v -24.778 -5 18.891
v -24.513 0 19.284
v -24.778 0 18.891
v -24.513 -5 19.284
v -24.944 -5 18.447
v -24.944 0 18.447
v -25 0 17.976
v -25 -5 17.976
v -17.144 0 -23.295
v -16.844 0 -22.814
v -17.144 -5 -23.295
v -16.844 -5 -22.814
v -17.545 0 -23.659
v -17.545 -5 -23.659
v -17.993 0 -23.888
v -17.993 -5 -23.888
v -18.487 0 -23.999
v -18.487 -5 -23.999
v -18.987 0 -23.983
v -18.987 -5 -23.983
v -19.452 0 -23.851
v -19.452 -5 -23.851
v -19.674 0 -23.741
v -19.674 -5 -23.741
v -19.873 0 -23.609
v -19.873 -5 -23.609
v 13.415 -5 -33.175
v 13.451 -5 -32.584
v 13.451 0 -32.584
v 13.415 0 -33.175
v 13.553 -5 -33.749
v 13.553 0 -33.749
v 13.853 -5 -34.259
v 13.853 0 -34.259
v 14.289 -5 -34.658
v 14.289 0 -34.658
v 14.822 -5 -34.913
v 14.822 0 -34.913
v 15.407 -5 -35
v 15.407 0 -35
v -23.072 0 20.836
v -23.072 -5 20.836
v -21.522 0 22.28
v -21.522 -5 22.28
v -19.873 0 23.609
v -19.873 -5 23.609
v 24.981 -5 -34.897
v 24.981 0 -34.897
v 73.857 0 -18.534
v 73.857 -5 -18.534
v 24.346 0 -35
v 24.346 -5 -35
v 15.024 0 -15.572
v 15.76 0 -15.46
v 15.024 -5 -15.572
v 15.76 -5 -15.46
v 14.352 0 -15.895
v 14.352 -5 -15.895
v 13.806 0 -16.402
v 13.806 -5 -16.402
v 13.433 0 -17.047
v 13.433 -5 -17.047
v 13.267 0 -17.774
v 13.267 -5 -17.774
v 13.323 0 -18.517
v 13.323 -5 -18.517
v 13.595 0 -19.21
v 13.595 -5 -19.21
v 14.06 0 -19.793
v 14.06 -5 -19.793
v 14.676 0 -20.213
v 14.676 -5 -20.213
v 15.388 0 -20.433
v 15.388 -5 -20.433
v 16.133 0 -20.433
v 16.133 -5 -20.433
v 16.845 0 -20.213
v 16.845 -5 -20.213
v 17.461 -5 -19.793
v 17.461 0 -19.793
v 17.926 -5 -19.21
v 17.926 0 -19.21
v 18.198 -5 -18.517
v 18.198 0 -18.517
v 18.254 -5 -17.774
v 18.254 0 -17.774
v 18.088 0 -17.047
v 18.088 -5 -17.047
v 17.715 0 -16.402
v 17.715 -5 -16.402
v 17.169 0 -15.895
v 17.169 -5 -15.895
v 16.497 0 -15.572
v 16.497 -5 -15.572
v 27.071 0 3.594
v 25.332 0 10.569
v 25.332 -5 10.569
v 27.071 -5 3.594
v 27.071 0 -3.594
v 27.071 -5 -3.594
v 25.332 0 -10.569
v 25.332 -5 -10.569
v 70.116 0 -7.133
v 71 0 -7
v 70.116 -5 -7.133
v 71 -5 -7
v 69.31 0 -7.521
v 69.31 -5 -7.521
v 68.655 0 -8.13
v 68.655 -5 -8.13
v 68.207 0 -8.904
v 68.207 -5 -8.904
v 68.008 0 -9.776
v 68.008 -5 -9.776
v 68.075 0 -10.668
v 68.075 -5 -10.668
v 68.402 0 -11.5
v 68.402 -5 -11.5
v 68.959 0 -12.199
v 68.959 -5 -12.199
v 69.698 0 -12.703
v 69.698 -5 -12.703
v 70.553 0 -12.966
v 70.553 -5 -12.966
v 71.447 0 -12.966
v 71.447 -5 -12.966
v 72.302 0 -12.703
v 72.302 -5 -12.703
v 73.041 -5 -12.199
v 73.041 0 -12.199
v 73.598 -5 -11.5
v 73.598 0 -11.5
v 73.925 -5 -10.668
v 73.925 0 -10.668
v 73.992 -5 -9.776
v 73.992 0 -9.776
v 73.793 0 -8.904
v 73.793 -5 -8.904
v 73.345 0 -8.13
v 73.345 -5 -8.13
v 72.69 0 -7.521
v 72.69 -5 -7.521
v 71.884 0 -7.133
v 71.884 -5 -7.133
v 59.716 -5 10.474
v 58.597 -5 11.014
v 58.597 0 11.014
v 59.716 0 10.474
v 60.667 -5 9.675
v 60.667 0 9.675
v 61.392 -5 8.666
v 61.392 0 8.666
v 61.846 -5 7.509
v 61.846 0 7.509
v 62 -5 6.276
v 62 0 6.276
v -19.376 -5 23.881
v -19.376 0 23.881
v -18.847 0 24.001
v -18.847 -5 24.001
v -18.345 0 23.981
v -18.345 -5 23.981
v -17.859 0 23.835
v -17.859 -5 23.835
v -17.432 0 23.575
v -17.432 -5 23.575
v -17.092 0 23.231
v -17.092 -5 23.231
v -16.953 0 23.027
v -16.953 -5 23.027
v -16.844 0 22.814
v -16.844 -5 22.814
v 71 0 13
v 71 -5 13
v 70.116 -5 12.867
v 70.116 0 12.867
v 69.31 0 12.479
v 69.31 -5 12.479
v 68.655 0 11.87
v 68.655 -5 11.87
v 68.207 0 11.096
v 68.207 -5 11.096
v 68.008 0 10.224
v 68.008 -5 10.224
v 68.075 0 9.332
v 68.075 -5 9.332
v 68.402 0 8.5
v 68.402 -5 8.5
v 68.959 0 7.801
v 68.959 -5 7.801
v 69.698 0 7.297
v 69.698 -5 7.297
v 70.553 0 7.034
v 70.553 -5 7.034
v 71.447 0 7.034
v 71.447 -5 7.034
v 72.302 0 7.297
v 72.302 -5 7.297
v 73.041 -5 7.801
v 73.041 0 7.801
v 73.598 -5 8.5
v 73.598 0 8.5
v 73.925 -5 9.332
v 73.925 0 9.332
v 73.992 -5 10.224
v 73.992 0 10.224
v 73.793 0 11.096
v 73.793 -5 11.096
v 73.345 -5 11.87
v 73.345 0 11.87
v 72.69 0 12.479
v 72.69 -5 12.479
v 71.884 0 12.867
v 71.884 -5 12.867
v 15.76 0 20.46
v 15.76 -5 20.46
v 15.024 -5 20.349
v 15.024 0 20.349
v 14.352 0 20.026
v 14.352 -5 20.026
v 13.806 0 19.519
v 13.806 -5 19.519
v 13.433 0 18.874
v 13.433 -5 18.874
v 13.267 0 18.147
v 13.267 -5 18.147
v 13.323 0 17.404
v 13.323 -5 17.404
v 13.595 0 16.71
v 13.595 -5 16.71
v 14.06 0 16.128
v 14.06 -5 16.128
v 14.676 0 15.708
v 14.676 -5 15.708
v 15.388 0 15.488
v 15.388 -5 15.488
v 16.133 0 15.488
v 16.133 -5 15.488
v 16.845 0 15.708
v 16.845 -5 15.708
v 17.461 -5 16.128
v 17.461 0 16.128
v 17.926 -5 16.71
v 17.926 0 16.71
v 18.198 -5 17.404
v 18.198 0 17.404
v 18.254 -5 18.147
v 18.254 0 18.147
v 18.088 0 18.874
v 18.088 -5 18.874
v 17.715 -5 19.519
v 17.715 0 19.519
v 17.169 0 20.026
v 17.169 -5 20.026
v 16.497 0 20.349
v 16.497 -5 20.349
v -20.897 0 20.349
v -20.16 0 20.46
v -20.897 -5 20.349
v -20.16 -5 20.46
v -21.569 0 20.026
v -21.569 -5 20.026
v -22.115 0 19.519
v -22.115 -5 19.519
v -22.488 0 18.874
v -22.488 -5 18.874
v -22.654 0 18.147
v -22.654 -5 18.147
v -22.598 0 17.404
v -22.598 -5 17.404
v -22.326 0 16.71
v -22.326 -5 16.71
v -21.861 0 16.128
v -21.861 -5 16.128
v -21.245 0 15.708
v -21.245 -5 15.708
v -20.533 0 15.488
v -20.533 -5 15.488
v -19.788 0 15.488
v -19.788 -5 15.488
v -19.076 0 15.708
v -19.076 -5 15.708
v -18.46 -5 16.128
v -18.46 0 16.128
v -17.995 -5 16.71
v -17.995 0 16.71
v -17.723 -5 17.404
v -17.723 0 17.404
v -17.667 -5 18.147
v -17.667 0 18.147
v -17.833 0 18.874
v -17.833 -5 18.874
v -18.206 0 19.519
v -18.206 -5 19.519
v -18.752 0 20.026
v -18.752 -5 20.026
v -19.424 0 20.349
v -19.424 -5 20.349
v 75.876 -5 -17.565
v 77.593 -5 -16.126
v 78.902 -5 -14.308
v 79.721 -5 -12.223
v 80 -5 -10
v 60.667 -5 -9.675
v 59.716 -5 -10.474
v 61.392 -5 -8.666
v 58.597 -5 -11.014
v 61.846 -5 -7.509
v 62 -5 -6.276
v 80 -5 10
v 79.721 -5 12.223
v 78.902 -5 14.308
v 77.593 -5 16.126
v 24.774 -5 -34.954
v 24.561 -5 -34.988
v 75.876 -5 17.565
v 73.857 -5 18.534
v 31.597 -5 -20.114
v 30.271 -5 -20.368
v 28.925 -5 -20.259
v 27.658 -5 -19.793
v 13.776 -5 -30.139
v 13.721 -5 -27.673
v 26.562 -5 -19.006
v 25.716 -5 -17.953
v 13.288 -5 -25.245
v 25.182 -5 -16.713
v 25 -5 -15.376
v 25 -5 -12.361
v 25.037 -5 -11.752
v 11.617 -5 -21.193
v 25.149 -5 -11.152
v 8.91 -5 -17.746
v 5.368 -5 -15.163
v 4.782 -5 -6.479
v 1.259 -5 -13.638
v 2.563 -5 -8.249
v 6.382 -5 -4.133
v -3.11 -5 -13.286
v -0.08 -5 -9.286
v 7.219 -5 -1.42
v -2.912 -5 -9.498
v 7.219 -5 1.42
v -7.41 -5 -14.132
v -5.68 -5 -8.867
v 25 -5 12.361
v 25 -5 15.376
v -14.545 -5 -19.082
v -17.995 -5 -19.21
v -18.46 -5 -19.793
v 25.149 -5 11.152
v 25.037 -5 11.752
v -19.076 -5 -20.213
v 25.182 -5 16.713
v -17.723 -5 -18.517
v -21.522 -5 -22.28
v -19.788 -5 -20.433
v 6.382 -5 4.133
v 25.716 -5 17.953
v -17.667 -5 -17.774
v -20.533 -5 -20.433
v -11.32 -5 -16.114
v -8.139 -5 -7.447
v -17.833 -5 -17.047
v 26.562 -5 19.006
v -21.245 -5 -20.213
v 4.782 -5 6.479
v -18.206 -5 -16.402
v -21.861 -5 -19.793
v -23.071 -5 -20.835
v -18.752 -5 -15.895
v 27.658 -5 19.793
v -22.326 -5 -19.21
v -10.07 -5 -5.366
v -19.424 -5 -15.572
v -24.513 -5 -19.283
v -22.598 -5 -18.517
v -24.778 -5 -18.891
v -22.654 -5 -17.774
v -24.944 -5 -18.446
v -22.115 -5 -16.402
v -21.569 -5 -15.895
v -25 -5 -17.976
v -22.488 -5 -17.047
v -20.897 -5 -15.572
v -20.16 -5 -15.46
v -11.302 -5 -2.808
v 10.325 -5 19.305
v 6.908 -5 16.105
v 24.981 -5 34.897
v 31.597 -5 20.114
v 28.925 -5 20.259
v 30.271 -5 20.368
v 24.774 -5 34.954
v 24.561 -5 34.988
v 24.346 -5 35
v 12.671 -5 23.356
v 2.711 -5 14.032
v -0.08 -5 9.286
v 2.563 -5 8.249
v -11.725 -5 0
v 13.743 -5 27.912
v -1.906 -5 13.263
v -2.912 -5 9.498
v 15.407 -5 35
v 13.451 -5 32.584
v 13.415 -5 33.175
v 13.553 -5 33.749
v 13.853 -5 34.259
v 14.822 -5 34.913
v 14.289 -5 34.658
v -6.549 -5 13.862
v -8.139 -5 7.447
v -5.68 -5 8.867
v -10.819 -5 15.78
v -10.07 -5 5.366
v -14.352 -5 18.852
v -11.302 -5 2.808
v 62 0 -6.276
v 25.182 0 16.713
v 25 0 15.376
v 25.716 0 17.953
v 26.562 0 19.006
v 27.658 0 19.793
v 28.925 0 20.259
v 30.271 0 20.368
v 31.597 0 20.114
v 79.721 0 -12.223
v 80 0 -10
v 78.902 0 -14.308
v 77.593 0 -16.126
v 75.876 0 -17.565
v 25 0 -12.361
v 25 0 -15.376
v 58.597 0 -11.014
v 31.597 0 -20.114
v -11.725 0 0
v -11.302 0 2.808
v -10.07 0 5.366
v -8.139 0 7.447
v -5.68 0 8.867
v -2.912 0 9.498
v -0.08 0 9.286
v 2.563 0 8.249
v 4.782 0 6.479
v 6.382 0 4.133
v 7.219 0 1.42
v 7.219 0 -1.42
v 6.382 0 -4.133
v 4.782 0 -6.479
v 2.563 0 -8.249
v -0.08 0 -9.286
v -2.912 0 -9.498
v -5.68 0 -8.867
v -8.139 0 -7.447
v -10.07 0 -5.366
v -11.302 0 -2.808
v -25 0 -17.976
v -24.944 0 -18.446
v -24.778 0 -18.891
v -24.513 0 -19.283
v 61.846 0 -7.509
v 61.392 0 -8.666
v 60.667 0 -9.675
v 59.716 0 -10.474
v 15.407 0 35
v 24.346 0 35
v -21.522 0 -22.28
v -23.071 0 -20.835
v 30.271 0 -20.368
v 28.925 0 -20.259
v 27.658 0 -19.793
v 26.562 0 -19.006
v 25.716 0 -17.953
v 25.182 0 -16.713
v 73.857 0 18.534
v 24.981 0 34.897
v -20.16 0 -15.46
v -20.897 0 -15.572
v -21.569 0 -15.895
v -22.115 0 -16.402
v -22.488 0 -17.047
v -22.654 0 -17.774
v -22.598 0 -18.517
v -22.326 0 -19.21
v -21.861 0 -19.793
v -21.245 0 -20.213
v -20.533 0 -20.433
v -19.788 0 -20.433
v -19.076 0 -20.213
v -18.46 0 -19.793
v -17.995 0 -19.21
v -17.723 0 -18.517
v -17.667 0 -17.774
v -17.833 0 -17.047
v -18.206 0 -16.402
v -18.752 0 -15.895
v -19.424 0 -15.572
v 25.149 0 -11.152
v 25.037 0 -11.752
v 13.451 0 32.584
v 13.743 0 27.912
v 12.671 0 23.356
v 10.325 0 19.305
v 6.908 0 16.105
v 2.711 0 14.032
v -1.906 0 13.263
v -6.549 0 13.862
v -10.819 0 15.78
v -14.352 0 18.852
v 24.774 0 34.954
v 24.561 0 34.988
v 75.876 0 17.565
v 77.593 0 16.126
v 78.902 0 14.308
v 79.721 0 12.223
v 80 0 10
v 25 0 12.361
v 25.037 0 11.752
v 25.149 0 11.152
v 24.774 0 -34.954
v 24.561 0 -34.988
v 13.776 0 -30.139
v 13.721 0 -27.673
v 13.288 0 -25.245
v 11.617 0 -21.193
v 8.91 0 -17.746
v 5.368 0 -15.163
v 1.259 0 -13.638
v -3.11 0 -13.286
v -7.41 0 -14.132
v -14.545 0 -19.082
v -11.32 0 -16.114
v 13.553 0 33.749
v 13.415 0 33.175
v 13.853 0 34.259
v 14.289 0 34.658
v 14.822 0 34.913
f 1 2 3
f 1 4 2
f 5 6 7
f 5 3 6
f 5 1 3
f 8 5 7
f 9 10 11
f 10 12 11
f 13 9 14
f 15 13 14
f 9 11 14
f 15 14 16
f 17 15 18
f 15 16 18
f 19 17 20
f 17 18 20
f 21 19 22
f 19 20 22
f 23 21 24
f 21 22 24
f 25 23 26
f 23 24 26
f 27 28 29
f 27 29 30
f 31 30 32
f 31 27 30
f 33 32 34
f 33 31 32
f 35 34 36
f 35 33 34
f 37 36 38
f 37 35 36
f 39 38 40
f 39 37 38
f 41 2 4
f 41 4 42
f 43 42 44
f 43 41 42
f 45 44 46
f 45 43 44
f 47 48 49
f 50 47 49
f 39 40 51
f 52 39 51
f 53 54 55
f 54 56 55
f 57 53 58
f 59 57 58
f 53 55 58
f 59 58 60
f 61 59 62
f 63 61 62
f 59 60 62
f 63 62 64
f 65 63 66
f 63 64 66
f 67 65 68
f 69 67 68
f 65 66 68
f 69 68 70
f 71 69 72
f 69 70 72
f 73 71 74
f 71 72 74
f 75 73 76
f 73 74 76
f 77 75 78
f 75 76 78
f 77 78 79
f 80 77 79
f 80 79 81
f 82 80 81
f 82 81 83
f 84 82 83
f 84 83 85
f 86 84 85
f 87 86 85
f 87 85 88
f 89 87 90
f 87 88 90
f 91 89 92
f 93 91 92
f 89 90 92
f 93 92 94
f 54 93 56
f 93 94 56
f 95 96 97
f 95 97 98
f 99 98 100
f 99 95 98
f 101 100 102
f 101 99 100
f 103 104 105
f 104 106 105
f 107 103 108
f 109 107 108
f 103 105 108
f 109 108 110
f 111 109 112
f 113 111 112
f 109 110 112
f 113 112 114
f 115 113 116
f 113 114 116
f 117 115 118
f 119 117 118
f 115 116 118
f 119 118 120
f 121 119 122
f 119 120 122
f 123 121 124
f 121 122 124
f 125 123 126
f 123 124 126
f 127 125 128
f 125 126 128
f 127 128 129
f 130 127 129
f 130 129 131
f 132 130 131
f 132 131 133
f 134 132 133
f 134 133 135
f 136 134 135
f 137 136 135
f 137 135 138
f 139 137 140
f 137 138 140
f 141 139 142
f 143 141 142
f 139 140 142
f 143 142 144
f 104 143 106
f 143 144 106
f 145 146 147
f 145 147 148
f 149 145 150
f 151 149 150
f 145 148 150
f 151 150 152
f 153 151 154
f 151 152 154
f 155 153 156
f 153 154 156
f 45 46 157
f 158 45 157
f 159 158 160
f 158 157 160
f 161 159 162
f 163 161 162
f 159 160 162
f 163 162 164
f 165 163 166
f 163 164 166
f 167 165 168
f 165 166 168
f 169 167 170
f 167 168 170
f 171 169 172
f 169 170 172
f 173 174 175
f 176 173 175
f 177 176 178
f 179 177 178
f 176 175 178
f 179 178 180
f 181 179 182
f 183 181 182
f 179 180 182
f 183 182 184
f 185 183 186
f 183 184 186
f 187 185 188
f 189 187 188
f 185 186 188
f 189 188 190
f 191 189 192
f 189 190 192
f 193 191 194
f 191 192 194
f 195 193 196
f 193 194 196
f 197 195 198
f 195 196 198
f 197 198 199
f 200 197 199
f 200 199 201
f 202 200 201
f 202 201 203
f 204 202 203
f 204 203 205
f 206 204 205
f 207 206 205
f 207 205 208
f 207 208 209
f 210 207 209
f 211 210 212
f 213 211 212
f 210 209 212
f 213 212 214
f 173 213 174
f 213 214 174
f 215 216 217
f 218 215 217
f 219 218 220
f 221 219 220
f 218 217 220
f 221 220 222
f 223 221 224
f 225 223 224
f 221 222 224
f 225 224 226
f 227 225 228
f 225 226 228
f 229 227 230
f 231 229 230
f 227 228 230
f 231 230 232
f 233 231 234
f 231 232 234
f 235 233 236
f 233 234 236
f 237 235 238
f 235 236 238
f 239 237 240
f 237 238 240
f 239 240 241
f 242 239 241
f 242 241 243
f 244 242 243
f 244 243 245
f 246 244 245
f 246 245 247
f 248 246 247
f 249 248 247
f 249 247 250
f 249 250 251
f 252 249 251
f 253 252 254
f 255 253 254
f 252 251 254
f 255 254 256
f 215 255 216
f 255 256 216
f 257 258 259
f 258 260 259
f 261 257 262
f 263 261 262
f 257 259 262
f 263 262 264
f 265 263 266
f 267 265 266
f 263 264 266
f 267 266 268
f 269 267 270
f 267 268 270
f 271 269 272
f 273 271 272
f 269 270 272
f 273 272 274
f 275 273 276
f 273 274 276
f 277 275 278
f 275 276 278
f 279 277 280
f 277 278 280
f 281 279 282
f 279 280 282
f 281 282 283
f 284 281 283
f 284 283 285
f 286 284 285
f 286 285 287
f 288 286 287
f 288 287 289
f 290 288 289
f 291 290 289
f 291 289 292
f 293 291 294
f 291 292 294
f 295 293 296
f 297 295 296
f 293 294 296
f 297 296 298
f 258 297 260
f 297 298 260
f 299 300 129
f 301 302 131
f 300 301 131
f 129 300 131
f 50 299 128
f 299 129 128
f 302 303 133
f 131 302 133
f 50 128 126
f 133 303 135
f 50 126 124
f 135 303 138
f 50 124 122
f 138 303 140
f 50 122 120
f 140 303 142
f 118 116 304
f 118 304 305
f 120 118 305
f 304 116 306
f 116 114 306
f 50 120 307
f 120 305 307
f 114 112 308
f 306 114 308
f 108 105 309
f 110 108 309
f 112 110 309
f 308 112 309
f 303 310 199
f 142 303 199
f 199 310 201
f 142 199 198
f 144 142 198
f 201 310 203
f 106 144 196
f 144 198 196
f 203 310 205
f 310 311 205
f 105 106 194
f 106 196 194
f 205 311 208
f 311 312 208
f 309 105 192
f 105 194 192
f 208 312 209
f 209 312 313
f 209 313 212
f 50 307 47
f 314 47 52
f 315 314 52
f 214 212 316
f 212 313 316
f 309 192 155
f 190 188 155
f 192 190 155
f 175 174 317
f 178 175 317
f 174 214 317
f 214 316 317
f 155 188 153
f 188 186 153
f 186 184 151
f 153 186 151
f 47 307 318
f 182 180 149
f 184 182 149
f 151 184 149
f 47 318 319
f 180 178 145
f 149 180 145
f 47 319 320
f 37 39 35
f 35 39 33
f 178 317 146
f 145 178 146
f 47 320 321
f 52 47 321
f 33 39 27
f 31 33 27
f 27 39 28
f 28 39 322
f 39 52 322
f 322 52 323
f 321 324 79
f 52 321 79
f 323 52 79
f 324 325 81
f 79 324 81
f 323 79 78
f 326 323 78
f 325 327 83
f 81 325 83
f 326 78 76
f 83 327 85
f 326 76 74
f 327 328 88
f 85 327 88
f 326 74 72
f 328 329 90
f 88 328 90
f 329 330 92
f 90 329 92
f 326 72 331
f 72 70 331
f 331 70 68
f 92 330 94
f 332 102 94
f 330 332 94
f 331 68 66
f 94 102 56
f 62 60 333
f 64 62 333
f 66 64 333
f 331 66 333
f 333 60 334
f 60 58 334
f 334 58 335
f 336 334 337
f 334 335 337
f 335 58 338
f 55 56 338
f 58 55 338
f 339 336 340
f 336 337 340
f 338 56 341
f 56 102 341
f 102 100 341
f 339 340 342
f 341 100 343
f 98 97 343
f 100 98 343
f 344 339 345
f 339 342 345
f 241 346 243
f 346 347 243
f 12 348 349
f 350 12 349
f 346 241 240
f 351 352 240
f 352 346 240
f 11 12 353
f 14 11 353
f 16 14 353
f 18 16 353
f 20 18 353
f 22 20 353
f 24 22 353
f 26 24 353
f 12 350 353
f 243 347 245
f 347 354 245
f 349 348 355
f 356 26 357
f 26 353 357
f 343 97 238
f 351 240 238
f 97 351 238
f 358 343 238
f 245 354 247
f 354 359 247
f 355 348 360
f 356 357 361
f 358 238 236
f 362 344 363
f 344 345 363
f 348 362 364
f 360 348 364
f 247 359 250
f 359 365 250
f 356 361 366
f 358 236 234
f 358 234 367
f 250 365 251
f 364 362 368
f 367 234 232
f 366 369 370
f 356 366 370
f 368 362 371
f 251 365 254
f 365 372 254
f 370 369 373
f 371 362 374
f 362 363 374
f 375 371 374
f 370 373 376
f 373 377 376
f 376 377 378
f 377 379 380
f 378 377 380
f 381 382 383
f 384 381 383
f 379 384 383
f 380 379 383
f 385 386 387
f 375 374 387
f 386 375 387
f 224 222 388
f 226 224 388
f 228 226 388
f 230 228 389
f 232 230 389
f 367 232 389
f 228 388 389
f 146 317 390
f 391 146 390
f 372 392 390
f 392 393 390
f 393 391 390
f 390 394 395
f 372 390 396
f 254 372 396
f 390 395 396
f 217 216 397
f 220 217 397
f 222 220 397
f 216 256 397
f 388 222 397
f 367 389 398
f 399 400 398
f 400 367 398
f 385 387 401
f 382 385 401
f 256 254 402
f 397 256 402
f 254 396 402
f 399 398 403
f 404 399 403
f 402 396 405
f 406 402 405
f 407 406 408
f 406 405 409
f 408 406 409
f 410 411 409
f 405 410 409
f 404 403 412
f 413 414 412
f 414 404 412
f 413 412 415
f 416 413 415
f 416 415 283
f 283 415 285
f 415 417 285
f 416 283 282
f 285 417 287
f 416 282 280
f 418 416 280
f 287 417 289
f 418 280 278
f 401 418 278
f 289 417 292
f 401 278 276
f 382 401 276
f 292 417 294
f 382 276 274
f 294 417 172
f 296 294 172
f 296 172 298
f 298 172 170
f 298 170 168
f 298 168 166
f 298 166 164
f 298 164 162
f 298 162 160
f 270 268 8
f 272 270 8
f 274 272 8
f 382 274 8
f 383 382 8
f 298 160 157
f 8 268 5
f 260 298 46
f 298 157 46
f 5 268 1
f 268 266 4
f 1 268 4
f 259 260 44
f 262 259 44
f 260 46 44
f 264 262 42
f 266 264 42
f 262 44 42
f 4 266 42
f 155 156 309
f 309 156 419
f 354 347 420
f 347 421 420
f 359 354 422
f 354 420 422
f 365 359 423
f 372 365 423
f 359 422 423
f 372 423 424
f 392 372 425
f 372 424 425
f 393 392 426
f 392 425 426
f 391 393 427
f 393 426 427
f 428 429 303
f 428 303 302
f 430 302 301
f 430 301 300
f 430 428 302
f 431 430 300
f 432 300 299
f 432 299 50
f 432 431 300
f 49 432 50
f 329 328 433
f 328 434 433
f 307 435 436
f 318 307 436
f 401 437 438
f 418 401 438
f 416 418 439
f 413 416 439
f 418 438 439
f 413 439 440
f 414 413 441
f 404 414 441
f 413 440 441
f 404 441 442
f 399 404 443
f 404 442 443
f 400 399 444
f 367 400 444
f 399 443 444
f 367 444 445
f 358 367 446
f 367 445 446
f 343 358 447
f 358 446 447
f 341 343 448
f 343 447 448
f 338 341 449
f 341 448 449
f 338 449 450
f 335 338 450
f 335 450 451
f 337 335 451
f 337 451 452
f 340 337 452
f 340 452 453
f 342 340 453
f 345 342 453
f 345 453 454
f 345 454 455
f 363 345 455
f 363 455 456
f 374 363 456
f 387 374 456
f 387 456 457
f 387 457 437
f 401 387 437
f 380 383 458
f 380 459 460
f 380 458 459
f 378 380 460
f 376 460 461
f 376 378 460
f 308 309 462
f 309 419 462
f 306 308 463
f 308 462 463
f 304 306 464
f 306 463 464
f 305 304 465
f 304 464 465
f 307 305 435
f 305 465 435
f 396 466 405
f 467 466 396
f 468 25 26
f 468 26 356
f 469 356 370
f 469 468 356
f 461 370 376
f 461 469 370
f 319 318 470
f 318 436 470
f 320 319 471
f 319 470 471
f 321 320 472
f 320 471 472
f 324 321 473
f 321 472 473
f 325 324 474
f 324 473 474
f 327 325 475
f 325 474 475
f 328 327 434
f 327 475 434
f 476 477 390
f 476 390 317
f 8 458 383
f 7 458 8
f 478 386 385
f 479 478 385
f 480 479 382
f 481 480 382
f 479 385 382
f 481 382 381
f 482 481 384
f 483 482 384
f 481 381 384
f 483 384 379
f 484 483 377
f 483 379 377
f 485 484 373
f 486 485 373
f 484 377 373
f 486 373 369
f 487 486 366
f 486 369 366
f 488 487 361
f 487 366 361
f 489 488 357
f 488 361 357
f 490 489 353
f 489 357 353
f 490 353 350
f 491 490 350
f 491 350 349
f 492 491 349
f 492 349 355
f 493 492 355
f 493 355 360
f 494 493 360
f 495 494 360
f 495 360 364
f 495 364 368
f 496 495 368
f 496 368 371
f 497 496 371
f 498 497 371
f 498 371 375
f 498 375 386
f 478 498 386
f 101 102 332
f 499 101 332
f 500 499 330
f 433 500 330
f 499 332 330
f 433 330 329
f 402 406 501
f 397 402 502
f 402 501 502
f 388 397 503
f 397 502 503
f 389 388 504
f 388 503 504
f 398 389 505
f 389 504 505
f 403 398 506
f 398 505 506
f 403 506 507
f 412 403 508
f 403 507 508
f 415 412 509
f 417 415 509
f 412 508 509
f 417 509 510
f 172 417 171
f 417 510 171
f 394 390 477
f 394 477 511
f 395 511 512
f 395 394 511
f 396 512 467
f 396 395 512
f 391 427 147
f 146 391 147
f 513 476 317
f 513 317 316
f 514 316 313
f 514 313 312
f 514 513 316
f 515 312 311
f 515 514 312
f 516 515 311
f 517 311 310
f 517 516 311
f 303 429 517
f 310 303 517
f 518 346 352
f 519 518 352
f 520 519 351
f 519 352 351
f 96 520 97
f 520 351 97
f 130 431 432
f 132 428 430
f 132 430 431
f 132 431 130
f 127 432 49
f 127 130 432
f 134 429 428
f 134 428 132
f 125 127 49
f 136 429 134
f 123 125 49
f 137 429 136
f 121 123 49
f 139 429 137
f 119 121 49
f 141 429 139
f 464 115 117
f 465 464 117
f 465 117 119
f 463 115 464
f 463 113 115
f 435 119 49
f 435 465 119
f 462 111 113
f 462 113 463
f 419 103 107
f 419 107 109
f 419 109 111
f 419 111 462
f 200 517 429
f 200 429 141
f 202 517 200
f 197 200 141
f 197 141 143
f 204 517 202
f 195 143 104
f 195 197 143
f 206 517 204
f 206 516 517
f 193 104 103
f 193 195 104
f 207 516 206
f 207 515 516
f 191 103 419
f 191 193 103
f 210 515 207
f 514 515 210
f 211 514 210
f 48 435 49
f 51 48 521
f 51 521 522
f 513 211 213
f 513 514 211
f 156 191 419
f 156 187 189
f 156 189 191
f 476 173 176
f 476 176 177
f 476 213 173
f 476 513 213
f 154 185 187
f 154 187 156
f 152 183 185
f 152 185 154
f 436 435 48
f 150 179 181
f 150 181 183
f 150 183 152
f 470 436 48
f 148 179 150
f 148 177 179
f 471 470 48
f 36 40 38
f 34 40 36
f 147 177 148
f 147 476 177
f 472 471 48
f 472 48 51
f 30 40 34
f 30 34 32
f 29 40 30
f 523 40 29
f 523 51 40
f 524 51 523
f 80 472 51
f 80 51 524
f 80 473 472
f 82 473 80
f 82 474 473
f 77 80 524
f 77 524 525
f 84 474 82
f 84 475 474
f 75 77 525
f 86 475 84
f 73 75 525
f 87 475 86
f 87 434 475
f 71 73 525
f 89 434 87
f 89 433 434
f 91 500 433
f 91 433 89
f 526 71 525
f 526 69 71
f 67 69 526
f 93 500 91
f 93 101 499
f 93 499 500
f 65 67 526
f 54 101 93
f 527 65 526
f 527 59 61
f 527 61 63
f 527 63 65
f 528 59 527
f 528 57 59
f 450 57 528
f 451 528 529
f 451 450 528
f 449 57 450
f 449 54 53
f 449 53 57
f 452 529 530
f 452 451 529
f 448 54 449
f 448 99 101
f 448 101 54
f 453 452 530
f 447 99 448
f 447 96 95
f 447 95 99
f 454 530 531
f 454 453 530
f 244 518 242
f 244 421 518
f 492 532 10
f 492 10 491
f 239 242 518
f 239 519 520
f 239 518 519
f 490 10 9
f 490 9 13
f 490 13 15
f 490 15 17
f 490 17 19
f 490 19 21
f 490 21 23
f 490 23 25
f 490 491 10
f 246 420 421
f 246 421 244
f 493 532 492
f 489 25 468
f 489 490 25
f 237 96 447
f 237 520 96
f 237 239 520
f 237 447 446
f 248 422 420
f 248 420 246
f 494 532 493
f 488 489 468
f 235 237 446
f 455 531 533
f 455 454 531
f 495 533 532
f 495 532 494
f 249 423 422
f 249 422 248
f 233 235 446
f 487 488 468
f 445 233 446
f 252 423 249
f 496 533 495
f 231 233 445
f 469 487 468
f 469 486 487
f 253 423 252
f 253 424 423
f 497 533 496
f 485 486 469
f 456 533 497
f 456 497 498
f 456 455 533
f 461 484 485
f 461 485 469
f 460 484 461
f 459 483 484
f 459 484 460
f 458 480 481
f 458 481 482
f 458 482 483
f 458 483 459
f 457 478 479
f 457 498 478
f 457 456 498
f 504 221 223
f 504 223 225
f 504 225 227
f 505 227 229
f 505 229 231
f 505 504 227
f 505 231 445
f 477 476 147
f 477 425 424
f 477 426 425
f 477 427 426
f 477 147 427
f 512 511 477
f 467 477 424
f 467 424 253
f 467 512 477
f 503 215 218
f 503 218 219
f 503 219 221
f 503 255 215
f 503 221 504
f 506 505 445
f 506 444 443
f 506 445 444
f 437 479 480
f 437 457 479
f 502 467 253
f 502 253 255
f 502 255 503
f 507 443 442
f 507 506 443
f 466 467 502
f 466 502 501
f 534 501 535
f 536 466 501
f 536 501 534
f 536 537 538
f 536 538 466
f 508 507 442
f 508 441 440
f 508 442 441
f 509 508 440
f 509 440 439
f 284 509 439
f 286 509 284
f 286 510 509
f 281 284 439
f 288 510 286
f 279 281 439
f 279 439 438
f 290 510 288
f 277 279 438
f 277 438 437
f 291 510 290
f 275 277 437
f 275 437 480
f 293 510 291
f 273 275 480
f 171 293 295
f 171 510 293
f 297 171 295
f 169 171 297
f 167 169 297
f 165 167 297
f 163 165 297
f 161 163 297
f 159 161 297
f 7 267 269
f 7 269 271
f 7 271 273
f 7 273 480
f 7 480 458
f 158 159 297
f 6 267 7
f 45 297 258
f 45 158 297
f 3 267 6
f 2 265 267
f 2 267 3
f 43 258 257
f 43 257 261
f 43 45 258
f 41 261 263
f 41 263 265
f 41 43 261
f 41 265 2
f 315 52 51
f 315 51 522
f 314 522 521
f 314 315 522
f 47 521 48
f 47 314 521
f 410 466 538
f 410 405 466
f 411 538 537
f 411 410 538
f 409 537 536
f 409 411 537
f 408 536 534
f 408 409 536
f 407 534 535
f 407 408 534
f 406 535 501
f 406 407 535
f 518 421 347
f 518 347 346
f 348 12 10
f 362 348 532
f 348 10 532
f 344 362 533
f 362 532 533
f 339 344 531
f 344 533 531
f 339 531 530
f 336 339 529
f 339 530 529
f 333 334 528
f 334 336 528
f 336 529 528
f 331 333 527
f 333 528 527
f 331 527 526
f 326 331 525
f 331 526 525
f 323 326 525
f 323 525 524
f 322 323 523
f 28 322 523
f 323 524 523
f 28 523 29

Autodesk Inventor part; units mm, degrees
ref_plane "YZ Plane" through (0, 0, 0) normal (1, 0, 0) x (0, 1, 0)
ref_plane "XZ Plane" through (0, 0, 0) normal (0, 1, 0) x (-1, 0, 0)
ref_plane "XY Plane" through (0, 0, 0) normal (0, 0, 1) x (1, 0, 0)
sketch "Sketch1" plane through (0, 0, 0) normal (0, 1, 0) x (-1, 0, 0)
  circle A0 centre (2.2, 0) radius 9.525 projected
  circle A1 centre (-15.7605, -17.9605) radius 2.0193 construction
  circle A2 centre (20.1605, -17.9605) radius 2.0193 construction
  circle A3 centre (20.1605, 17.9605) radius 2.0193 construction
  circle A4 centre (-15.7605, 17.9605) radius 2.0193 construction
  circle A5 centre (2.2, -29.26) radius 15.5575 construction
  circle A6 centre (2.2, 29.26) radius 15.5575 construction
  circle A7 centre (-71, 10) radius 3 construction
  circle A8 centre (-71, -10) radius 3 construction
  line L0 (-93.1199, -15.5417) -> (-49.1294, -16.4557) construction
  line L1 (-49.1294, -16.4557) -> (-48.8801, -4.4583) construction
  line L2 (-92.8706, -3.5443) -> (-48.8801, -4.4583) construction
  line L3 (-93.1199, -15.5417) -> (-92.8706, -3.5443) construction
  line L4 (-25, 210) -> (-25, -210) construction
  line L5 (25, 210) -> (25, -210) construction
  arc A9 (17.6544, -25.1175) -> (-13.2881, -25.2451) centre (2.2, -29.26) ccw
  circle A10 centre (-71, -10) radius 9 construction
  circle A11 centre (-71, 10) radius 9 construction
  line L6 (23, -35) -> (-24.672, -35) construction
  line L7 (-24.672, 35) -> (23, 35) construction
  line L8 (25, -18.7054) -> (25, 18.7057)
  arc A12 (17.6544, -25.1175) -> (25, -18.7054) centre (2.2, 0) ccw
  arc A13 (-13.2544, -25.1175) -> (-12.7349, -35) centre (2.2, -29.26) ccw
  arc A14 (-12.7349, 35) -> (17.6545, 25.1177) centre (2.2, 29.26) ccw
  arc A15 (25, 18.7057) -> (17.6545, 25.1177) centre (2.2, 0) ccw
  line L9 (-12.7349, -35) -> (-24.672, -35)
  line L10 (-12.7349, 35) -> (-24.672, 35)
  line L11 (-24.672, -35) -> (-73.8571, -18.5345)
  line L12 (-24.672, 35) -> (-73.8571, 18.5345)
  line L13 (-80, -10) -> (-80, 10)
  arc A16 (-80, -10) -> (-73.8571, -18.5345) centre (-71, -10) ccw
  arc A17 (-73.8571, 18.5345) -> (-80, 10) centre (-71, 10) ccw
  line L14 (-58.5968, -11.0143) -> (-31.5968, -20.1136) projected
  arc A18 (-62, -6.2761) -> (-58.5968, -11.0143) centre (-57, -6.2761) ccw projected
  line L15 (-62, 6.2761) -> (-62, -6.2761) projected
  arc A19 (-58.5968, 11.0143) -> (-62, 6.2761) centre (-57, 6.2761) ccw projected
  line L16 (-31.5968, 20.1136) -> (-58.5968, 11.0143) projected
  arc A20 (-25, 15.3755) -> (-31.5968, 20.1136) centre (-30, 15.3755) ccw projected
  arc A21 (-31.5968, -20.1136) -> (-25, -15.3755) centre (-30, -15.3755) ccw projected
  arc A22 (-25, 11.397) -> (-25, -11.397) centre (2.2, 0) ccw
  line L17 (-25, -15.3755) -> (-25, -11.397)
  line L18 (-25, 15.3755) -> (-25, 11.397)
  arc A23 (-18.6534, -20.8534) -> (23.0534, 20.8534) centre (2.2, 0) ccw projected
  spline S0 degree 3 poles (23.0534, 20.8534) (21.798, 22.1089) (20.4403, 23.2417) (18.9803, 24.2518) (18.9572, 24.2679) (18.9354, 24.2829) (18.9107, 24.2998) (17.3595, 25.3666) (15.7211, 26.2765) (13.9955, 27.0296) (13.9681, 27.0415) (13.9418, 27.0529) (13.9132, 27.0653) (12.1415, 27.8321) (10.3123, 28.4192) (8.4258, 28.8266) (8.3649, 28.8397) (8.3053, 28.8524) (8.243, 28.8654) (6.2506, 29.2826) (4.2356, 29.4912) (2.2, 29.4912) (0.228, 29.4912) (-1.724, 29.2955) (-3.6561, 28.9039) (-3.7184, 28.8913) (-3.7821, 28.8782) (-3.843, 28.8654) (-5.7631, 28.4635) (-7.6246, 27.8758) (-9.4274, 27.1023) (-9.456, 27.09) (-9.4858, 27.0772) (-9.5132, 27.0653) (-11.241, 26.3176) (-12.8822, 25.4127) (-14.4368, 24.3505) (-14.4614, 24.3337) (-14.4875, 24.3158) (-14.5107, 24.2998) (-15.9968, 23.278) (-17.3782, 22.1287) (-18.6534, 20.8534) (-19.9088, 19.5981) (-21.0416, 18.2404) (-22.0518, 16.7803) (-22.0679, 16.7572) (-22.0829, 16.7354) (-22.0998, 16.7107) (-23.1666, 15.1595) (-24.0765, 13.5211) (-24.8296, 11.7955) (-24.8415, 11.7681) (-24.8529, 11.7418) (-24.8653, 11.7132) (-25.6321, 9.9415) (-26.2192, 8.1123) (-26.6266, 6.2258) (-26.6397, 6.1649) (-26.6524, 6.1053) (-26.6654, 6.043) (-27.0826, 4.0506) (-27.2912, 2.0356) (-27.2912, 0) (-27.2912, -1.972) (-27.0955, -3.924) (-26.7039, -5.8561) (-26.6913, -5.9184) (-26.6782, -5.9821) (-26.6654, -6.043) (-26.2635, -7.9631) (-25.6758, -9.8246) (-24.9023, -11.6274) (-24.89, -11.656) (-24.8772, -11.6858) (-24.8653, -11.7132) (-24.1176, -13.441) (-23.2127, -15.0822) (-22.1505, -16.6368) (-22.1337, -16.6614) (-22.1158, -16.6875) (-22.0998, -16.7107) (-21.0779, -18.1969) (-19.929, -19.5778) (-18.6534, -20.8534) knots 0 0 0 0 0.061523 0.061523 0.061523 0.0625 0.0625 0.0625 0.124023 0.124023 0.124023 0.125 0.125 0.125 0.185547 0.185547 0.185547 0.1875 0.1875 0.1875 0.25 0.25 0.25 0.310547 0.310547 0.310547 0.3125 0.3125 0.3125 0.374023 0.374023 0.374023 0.375 0.375 0.375 0.436523 0.436523 0.436523 0.4375 0.4375 0.4375 0.5 0.5 0.5 0.561523 0.561523 0.561523 0.5625 0.5625 0.5625 0.624023 0.624023 0.624023 0.625 0.625 0.625 0.685547 0.685547 0.685547 0.6875 0.6875 0.6875 0.75 0.75 0.75 0.810547 0.810547 0.810547 0.8125 0.8125 0.8125 0.874023 0.874023 0.874023 0.875 0.875 0.875 0.936523 0.936523 0.936523 0.9375 0.9375 0.9375 1 1 1 1 projected
  point P0 (0, 0)
  point P1 (-13.2881, -25.2451)
  dimension "d4" = 16
  dimension "d5" = 18
  dimension "d6" = 18
  dimension "d7" = 16
extrude "Extrusion1" add sketch "Sketch1" against normal blind 5 contours A9 A23 S0 A22 A14 A15 L8 A12 | A9 A13 L9 L11 A16 L13 A17 L12 L10 A14 S0 L18 A20 L16 A19 L15 A18 L14 A21 L17 A23
fillet "Fillet1" radius 5 2 edges at (25, -2.5, 11.397) (25, -2.5, -11.397)
fillet "Fillet2" radius 2 8 edges at (12.7349, -2.5, 35) (-17.6545, -2.5, 25.1177) (-17.6544, -2.5, -25.1175) (12.7349, -2.5, -35) (24.672, -2.5, -35) (24.672, -2.5, 35) (-25, -2.5, -18.7054) (-25, -2.5, 18.7057)
sketch "Sketch2" plane through (0, 0, 0) normal (0, 1, 0) x (1, 0, 0)
  circle A0 centre (71, 10) radius 3 projected
  circle A1 centre (71, -10) radius 3 projected
  point P0 (0, 0)
hole "Hole1" at (71, 0, -10) at (71, 0, 10) direction (0, -1, 0) diameter 6 end through all
sketch "Sketch3" plane through (0, 0, 0) normal (0, 1, 0) x (1, 0, 0)
  point P0 (0, 0)
sketch "Sketch4" plane through (0, 0, 0) normal (0, 1, 0) x (1, 0, 0)
  circle A0 centre (-20.1605, -17.9605) radius 3 projected
  circle A1 centre (15.7605, 17.9605) radius 3 projected
  circle A2 centre (15.7605, -17.9605) radius 3 projected
  circle A3 centre (-20.1605, 17.9605) radius 3 projected
  circle A4 centre (-4, -61.01) radius 14.2875 projected
  circle A5 centre (-2.2, 29.26) radius 14.2875 projected
  circle A6 centre (-2.2, -29.26) radius 14.2875 projected
  circle A7 centre (-4, 61.01) radius 14.2875 projected
  circle A8 centre (-2.2, 0) radius 9.5 projected
  line L0 (-25, -210) -> (25, -210) projected
  line L1 (25, -210) -> (25, 210) projected
  line L2 (-25, 210) -> (25, 210) projected
  line L3 (-25, -210) -> (-25, 210) projected
  point P0 (0, 0)
hole "Hole2" at (15.7605, 0, -17.9605) at (15.7605, 0, 17.9605) at (-20.1605, 0, 17.9605) at (-20.1605, 0, -17.9605) direction (0, -1, 0) diameter 5 depth 8 tip angle 118
properties part number "pistonplatefront"
